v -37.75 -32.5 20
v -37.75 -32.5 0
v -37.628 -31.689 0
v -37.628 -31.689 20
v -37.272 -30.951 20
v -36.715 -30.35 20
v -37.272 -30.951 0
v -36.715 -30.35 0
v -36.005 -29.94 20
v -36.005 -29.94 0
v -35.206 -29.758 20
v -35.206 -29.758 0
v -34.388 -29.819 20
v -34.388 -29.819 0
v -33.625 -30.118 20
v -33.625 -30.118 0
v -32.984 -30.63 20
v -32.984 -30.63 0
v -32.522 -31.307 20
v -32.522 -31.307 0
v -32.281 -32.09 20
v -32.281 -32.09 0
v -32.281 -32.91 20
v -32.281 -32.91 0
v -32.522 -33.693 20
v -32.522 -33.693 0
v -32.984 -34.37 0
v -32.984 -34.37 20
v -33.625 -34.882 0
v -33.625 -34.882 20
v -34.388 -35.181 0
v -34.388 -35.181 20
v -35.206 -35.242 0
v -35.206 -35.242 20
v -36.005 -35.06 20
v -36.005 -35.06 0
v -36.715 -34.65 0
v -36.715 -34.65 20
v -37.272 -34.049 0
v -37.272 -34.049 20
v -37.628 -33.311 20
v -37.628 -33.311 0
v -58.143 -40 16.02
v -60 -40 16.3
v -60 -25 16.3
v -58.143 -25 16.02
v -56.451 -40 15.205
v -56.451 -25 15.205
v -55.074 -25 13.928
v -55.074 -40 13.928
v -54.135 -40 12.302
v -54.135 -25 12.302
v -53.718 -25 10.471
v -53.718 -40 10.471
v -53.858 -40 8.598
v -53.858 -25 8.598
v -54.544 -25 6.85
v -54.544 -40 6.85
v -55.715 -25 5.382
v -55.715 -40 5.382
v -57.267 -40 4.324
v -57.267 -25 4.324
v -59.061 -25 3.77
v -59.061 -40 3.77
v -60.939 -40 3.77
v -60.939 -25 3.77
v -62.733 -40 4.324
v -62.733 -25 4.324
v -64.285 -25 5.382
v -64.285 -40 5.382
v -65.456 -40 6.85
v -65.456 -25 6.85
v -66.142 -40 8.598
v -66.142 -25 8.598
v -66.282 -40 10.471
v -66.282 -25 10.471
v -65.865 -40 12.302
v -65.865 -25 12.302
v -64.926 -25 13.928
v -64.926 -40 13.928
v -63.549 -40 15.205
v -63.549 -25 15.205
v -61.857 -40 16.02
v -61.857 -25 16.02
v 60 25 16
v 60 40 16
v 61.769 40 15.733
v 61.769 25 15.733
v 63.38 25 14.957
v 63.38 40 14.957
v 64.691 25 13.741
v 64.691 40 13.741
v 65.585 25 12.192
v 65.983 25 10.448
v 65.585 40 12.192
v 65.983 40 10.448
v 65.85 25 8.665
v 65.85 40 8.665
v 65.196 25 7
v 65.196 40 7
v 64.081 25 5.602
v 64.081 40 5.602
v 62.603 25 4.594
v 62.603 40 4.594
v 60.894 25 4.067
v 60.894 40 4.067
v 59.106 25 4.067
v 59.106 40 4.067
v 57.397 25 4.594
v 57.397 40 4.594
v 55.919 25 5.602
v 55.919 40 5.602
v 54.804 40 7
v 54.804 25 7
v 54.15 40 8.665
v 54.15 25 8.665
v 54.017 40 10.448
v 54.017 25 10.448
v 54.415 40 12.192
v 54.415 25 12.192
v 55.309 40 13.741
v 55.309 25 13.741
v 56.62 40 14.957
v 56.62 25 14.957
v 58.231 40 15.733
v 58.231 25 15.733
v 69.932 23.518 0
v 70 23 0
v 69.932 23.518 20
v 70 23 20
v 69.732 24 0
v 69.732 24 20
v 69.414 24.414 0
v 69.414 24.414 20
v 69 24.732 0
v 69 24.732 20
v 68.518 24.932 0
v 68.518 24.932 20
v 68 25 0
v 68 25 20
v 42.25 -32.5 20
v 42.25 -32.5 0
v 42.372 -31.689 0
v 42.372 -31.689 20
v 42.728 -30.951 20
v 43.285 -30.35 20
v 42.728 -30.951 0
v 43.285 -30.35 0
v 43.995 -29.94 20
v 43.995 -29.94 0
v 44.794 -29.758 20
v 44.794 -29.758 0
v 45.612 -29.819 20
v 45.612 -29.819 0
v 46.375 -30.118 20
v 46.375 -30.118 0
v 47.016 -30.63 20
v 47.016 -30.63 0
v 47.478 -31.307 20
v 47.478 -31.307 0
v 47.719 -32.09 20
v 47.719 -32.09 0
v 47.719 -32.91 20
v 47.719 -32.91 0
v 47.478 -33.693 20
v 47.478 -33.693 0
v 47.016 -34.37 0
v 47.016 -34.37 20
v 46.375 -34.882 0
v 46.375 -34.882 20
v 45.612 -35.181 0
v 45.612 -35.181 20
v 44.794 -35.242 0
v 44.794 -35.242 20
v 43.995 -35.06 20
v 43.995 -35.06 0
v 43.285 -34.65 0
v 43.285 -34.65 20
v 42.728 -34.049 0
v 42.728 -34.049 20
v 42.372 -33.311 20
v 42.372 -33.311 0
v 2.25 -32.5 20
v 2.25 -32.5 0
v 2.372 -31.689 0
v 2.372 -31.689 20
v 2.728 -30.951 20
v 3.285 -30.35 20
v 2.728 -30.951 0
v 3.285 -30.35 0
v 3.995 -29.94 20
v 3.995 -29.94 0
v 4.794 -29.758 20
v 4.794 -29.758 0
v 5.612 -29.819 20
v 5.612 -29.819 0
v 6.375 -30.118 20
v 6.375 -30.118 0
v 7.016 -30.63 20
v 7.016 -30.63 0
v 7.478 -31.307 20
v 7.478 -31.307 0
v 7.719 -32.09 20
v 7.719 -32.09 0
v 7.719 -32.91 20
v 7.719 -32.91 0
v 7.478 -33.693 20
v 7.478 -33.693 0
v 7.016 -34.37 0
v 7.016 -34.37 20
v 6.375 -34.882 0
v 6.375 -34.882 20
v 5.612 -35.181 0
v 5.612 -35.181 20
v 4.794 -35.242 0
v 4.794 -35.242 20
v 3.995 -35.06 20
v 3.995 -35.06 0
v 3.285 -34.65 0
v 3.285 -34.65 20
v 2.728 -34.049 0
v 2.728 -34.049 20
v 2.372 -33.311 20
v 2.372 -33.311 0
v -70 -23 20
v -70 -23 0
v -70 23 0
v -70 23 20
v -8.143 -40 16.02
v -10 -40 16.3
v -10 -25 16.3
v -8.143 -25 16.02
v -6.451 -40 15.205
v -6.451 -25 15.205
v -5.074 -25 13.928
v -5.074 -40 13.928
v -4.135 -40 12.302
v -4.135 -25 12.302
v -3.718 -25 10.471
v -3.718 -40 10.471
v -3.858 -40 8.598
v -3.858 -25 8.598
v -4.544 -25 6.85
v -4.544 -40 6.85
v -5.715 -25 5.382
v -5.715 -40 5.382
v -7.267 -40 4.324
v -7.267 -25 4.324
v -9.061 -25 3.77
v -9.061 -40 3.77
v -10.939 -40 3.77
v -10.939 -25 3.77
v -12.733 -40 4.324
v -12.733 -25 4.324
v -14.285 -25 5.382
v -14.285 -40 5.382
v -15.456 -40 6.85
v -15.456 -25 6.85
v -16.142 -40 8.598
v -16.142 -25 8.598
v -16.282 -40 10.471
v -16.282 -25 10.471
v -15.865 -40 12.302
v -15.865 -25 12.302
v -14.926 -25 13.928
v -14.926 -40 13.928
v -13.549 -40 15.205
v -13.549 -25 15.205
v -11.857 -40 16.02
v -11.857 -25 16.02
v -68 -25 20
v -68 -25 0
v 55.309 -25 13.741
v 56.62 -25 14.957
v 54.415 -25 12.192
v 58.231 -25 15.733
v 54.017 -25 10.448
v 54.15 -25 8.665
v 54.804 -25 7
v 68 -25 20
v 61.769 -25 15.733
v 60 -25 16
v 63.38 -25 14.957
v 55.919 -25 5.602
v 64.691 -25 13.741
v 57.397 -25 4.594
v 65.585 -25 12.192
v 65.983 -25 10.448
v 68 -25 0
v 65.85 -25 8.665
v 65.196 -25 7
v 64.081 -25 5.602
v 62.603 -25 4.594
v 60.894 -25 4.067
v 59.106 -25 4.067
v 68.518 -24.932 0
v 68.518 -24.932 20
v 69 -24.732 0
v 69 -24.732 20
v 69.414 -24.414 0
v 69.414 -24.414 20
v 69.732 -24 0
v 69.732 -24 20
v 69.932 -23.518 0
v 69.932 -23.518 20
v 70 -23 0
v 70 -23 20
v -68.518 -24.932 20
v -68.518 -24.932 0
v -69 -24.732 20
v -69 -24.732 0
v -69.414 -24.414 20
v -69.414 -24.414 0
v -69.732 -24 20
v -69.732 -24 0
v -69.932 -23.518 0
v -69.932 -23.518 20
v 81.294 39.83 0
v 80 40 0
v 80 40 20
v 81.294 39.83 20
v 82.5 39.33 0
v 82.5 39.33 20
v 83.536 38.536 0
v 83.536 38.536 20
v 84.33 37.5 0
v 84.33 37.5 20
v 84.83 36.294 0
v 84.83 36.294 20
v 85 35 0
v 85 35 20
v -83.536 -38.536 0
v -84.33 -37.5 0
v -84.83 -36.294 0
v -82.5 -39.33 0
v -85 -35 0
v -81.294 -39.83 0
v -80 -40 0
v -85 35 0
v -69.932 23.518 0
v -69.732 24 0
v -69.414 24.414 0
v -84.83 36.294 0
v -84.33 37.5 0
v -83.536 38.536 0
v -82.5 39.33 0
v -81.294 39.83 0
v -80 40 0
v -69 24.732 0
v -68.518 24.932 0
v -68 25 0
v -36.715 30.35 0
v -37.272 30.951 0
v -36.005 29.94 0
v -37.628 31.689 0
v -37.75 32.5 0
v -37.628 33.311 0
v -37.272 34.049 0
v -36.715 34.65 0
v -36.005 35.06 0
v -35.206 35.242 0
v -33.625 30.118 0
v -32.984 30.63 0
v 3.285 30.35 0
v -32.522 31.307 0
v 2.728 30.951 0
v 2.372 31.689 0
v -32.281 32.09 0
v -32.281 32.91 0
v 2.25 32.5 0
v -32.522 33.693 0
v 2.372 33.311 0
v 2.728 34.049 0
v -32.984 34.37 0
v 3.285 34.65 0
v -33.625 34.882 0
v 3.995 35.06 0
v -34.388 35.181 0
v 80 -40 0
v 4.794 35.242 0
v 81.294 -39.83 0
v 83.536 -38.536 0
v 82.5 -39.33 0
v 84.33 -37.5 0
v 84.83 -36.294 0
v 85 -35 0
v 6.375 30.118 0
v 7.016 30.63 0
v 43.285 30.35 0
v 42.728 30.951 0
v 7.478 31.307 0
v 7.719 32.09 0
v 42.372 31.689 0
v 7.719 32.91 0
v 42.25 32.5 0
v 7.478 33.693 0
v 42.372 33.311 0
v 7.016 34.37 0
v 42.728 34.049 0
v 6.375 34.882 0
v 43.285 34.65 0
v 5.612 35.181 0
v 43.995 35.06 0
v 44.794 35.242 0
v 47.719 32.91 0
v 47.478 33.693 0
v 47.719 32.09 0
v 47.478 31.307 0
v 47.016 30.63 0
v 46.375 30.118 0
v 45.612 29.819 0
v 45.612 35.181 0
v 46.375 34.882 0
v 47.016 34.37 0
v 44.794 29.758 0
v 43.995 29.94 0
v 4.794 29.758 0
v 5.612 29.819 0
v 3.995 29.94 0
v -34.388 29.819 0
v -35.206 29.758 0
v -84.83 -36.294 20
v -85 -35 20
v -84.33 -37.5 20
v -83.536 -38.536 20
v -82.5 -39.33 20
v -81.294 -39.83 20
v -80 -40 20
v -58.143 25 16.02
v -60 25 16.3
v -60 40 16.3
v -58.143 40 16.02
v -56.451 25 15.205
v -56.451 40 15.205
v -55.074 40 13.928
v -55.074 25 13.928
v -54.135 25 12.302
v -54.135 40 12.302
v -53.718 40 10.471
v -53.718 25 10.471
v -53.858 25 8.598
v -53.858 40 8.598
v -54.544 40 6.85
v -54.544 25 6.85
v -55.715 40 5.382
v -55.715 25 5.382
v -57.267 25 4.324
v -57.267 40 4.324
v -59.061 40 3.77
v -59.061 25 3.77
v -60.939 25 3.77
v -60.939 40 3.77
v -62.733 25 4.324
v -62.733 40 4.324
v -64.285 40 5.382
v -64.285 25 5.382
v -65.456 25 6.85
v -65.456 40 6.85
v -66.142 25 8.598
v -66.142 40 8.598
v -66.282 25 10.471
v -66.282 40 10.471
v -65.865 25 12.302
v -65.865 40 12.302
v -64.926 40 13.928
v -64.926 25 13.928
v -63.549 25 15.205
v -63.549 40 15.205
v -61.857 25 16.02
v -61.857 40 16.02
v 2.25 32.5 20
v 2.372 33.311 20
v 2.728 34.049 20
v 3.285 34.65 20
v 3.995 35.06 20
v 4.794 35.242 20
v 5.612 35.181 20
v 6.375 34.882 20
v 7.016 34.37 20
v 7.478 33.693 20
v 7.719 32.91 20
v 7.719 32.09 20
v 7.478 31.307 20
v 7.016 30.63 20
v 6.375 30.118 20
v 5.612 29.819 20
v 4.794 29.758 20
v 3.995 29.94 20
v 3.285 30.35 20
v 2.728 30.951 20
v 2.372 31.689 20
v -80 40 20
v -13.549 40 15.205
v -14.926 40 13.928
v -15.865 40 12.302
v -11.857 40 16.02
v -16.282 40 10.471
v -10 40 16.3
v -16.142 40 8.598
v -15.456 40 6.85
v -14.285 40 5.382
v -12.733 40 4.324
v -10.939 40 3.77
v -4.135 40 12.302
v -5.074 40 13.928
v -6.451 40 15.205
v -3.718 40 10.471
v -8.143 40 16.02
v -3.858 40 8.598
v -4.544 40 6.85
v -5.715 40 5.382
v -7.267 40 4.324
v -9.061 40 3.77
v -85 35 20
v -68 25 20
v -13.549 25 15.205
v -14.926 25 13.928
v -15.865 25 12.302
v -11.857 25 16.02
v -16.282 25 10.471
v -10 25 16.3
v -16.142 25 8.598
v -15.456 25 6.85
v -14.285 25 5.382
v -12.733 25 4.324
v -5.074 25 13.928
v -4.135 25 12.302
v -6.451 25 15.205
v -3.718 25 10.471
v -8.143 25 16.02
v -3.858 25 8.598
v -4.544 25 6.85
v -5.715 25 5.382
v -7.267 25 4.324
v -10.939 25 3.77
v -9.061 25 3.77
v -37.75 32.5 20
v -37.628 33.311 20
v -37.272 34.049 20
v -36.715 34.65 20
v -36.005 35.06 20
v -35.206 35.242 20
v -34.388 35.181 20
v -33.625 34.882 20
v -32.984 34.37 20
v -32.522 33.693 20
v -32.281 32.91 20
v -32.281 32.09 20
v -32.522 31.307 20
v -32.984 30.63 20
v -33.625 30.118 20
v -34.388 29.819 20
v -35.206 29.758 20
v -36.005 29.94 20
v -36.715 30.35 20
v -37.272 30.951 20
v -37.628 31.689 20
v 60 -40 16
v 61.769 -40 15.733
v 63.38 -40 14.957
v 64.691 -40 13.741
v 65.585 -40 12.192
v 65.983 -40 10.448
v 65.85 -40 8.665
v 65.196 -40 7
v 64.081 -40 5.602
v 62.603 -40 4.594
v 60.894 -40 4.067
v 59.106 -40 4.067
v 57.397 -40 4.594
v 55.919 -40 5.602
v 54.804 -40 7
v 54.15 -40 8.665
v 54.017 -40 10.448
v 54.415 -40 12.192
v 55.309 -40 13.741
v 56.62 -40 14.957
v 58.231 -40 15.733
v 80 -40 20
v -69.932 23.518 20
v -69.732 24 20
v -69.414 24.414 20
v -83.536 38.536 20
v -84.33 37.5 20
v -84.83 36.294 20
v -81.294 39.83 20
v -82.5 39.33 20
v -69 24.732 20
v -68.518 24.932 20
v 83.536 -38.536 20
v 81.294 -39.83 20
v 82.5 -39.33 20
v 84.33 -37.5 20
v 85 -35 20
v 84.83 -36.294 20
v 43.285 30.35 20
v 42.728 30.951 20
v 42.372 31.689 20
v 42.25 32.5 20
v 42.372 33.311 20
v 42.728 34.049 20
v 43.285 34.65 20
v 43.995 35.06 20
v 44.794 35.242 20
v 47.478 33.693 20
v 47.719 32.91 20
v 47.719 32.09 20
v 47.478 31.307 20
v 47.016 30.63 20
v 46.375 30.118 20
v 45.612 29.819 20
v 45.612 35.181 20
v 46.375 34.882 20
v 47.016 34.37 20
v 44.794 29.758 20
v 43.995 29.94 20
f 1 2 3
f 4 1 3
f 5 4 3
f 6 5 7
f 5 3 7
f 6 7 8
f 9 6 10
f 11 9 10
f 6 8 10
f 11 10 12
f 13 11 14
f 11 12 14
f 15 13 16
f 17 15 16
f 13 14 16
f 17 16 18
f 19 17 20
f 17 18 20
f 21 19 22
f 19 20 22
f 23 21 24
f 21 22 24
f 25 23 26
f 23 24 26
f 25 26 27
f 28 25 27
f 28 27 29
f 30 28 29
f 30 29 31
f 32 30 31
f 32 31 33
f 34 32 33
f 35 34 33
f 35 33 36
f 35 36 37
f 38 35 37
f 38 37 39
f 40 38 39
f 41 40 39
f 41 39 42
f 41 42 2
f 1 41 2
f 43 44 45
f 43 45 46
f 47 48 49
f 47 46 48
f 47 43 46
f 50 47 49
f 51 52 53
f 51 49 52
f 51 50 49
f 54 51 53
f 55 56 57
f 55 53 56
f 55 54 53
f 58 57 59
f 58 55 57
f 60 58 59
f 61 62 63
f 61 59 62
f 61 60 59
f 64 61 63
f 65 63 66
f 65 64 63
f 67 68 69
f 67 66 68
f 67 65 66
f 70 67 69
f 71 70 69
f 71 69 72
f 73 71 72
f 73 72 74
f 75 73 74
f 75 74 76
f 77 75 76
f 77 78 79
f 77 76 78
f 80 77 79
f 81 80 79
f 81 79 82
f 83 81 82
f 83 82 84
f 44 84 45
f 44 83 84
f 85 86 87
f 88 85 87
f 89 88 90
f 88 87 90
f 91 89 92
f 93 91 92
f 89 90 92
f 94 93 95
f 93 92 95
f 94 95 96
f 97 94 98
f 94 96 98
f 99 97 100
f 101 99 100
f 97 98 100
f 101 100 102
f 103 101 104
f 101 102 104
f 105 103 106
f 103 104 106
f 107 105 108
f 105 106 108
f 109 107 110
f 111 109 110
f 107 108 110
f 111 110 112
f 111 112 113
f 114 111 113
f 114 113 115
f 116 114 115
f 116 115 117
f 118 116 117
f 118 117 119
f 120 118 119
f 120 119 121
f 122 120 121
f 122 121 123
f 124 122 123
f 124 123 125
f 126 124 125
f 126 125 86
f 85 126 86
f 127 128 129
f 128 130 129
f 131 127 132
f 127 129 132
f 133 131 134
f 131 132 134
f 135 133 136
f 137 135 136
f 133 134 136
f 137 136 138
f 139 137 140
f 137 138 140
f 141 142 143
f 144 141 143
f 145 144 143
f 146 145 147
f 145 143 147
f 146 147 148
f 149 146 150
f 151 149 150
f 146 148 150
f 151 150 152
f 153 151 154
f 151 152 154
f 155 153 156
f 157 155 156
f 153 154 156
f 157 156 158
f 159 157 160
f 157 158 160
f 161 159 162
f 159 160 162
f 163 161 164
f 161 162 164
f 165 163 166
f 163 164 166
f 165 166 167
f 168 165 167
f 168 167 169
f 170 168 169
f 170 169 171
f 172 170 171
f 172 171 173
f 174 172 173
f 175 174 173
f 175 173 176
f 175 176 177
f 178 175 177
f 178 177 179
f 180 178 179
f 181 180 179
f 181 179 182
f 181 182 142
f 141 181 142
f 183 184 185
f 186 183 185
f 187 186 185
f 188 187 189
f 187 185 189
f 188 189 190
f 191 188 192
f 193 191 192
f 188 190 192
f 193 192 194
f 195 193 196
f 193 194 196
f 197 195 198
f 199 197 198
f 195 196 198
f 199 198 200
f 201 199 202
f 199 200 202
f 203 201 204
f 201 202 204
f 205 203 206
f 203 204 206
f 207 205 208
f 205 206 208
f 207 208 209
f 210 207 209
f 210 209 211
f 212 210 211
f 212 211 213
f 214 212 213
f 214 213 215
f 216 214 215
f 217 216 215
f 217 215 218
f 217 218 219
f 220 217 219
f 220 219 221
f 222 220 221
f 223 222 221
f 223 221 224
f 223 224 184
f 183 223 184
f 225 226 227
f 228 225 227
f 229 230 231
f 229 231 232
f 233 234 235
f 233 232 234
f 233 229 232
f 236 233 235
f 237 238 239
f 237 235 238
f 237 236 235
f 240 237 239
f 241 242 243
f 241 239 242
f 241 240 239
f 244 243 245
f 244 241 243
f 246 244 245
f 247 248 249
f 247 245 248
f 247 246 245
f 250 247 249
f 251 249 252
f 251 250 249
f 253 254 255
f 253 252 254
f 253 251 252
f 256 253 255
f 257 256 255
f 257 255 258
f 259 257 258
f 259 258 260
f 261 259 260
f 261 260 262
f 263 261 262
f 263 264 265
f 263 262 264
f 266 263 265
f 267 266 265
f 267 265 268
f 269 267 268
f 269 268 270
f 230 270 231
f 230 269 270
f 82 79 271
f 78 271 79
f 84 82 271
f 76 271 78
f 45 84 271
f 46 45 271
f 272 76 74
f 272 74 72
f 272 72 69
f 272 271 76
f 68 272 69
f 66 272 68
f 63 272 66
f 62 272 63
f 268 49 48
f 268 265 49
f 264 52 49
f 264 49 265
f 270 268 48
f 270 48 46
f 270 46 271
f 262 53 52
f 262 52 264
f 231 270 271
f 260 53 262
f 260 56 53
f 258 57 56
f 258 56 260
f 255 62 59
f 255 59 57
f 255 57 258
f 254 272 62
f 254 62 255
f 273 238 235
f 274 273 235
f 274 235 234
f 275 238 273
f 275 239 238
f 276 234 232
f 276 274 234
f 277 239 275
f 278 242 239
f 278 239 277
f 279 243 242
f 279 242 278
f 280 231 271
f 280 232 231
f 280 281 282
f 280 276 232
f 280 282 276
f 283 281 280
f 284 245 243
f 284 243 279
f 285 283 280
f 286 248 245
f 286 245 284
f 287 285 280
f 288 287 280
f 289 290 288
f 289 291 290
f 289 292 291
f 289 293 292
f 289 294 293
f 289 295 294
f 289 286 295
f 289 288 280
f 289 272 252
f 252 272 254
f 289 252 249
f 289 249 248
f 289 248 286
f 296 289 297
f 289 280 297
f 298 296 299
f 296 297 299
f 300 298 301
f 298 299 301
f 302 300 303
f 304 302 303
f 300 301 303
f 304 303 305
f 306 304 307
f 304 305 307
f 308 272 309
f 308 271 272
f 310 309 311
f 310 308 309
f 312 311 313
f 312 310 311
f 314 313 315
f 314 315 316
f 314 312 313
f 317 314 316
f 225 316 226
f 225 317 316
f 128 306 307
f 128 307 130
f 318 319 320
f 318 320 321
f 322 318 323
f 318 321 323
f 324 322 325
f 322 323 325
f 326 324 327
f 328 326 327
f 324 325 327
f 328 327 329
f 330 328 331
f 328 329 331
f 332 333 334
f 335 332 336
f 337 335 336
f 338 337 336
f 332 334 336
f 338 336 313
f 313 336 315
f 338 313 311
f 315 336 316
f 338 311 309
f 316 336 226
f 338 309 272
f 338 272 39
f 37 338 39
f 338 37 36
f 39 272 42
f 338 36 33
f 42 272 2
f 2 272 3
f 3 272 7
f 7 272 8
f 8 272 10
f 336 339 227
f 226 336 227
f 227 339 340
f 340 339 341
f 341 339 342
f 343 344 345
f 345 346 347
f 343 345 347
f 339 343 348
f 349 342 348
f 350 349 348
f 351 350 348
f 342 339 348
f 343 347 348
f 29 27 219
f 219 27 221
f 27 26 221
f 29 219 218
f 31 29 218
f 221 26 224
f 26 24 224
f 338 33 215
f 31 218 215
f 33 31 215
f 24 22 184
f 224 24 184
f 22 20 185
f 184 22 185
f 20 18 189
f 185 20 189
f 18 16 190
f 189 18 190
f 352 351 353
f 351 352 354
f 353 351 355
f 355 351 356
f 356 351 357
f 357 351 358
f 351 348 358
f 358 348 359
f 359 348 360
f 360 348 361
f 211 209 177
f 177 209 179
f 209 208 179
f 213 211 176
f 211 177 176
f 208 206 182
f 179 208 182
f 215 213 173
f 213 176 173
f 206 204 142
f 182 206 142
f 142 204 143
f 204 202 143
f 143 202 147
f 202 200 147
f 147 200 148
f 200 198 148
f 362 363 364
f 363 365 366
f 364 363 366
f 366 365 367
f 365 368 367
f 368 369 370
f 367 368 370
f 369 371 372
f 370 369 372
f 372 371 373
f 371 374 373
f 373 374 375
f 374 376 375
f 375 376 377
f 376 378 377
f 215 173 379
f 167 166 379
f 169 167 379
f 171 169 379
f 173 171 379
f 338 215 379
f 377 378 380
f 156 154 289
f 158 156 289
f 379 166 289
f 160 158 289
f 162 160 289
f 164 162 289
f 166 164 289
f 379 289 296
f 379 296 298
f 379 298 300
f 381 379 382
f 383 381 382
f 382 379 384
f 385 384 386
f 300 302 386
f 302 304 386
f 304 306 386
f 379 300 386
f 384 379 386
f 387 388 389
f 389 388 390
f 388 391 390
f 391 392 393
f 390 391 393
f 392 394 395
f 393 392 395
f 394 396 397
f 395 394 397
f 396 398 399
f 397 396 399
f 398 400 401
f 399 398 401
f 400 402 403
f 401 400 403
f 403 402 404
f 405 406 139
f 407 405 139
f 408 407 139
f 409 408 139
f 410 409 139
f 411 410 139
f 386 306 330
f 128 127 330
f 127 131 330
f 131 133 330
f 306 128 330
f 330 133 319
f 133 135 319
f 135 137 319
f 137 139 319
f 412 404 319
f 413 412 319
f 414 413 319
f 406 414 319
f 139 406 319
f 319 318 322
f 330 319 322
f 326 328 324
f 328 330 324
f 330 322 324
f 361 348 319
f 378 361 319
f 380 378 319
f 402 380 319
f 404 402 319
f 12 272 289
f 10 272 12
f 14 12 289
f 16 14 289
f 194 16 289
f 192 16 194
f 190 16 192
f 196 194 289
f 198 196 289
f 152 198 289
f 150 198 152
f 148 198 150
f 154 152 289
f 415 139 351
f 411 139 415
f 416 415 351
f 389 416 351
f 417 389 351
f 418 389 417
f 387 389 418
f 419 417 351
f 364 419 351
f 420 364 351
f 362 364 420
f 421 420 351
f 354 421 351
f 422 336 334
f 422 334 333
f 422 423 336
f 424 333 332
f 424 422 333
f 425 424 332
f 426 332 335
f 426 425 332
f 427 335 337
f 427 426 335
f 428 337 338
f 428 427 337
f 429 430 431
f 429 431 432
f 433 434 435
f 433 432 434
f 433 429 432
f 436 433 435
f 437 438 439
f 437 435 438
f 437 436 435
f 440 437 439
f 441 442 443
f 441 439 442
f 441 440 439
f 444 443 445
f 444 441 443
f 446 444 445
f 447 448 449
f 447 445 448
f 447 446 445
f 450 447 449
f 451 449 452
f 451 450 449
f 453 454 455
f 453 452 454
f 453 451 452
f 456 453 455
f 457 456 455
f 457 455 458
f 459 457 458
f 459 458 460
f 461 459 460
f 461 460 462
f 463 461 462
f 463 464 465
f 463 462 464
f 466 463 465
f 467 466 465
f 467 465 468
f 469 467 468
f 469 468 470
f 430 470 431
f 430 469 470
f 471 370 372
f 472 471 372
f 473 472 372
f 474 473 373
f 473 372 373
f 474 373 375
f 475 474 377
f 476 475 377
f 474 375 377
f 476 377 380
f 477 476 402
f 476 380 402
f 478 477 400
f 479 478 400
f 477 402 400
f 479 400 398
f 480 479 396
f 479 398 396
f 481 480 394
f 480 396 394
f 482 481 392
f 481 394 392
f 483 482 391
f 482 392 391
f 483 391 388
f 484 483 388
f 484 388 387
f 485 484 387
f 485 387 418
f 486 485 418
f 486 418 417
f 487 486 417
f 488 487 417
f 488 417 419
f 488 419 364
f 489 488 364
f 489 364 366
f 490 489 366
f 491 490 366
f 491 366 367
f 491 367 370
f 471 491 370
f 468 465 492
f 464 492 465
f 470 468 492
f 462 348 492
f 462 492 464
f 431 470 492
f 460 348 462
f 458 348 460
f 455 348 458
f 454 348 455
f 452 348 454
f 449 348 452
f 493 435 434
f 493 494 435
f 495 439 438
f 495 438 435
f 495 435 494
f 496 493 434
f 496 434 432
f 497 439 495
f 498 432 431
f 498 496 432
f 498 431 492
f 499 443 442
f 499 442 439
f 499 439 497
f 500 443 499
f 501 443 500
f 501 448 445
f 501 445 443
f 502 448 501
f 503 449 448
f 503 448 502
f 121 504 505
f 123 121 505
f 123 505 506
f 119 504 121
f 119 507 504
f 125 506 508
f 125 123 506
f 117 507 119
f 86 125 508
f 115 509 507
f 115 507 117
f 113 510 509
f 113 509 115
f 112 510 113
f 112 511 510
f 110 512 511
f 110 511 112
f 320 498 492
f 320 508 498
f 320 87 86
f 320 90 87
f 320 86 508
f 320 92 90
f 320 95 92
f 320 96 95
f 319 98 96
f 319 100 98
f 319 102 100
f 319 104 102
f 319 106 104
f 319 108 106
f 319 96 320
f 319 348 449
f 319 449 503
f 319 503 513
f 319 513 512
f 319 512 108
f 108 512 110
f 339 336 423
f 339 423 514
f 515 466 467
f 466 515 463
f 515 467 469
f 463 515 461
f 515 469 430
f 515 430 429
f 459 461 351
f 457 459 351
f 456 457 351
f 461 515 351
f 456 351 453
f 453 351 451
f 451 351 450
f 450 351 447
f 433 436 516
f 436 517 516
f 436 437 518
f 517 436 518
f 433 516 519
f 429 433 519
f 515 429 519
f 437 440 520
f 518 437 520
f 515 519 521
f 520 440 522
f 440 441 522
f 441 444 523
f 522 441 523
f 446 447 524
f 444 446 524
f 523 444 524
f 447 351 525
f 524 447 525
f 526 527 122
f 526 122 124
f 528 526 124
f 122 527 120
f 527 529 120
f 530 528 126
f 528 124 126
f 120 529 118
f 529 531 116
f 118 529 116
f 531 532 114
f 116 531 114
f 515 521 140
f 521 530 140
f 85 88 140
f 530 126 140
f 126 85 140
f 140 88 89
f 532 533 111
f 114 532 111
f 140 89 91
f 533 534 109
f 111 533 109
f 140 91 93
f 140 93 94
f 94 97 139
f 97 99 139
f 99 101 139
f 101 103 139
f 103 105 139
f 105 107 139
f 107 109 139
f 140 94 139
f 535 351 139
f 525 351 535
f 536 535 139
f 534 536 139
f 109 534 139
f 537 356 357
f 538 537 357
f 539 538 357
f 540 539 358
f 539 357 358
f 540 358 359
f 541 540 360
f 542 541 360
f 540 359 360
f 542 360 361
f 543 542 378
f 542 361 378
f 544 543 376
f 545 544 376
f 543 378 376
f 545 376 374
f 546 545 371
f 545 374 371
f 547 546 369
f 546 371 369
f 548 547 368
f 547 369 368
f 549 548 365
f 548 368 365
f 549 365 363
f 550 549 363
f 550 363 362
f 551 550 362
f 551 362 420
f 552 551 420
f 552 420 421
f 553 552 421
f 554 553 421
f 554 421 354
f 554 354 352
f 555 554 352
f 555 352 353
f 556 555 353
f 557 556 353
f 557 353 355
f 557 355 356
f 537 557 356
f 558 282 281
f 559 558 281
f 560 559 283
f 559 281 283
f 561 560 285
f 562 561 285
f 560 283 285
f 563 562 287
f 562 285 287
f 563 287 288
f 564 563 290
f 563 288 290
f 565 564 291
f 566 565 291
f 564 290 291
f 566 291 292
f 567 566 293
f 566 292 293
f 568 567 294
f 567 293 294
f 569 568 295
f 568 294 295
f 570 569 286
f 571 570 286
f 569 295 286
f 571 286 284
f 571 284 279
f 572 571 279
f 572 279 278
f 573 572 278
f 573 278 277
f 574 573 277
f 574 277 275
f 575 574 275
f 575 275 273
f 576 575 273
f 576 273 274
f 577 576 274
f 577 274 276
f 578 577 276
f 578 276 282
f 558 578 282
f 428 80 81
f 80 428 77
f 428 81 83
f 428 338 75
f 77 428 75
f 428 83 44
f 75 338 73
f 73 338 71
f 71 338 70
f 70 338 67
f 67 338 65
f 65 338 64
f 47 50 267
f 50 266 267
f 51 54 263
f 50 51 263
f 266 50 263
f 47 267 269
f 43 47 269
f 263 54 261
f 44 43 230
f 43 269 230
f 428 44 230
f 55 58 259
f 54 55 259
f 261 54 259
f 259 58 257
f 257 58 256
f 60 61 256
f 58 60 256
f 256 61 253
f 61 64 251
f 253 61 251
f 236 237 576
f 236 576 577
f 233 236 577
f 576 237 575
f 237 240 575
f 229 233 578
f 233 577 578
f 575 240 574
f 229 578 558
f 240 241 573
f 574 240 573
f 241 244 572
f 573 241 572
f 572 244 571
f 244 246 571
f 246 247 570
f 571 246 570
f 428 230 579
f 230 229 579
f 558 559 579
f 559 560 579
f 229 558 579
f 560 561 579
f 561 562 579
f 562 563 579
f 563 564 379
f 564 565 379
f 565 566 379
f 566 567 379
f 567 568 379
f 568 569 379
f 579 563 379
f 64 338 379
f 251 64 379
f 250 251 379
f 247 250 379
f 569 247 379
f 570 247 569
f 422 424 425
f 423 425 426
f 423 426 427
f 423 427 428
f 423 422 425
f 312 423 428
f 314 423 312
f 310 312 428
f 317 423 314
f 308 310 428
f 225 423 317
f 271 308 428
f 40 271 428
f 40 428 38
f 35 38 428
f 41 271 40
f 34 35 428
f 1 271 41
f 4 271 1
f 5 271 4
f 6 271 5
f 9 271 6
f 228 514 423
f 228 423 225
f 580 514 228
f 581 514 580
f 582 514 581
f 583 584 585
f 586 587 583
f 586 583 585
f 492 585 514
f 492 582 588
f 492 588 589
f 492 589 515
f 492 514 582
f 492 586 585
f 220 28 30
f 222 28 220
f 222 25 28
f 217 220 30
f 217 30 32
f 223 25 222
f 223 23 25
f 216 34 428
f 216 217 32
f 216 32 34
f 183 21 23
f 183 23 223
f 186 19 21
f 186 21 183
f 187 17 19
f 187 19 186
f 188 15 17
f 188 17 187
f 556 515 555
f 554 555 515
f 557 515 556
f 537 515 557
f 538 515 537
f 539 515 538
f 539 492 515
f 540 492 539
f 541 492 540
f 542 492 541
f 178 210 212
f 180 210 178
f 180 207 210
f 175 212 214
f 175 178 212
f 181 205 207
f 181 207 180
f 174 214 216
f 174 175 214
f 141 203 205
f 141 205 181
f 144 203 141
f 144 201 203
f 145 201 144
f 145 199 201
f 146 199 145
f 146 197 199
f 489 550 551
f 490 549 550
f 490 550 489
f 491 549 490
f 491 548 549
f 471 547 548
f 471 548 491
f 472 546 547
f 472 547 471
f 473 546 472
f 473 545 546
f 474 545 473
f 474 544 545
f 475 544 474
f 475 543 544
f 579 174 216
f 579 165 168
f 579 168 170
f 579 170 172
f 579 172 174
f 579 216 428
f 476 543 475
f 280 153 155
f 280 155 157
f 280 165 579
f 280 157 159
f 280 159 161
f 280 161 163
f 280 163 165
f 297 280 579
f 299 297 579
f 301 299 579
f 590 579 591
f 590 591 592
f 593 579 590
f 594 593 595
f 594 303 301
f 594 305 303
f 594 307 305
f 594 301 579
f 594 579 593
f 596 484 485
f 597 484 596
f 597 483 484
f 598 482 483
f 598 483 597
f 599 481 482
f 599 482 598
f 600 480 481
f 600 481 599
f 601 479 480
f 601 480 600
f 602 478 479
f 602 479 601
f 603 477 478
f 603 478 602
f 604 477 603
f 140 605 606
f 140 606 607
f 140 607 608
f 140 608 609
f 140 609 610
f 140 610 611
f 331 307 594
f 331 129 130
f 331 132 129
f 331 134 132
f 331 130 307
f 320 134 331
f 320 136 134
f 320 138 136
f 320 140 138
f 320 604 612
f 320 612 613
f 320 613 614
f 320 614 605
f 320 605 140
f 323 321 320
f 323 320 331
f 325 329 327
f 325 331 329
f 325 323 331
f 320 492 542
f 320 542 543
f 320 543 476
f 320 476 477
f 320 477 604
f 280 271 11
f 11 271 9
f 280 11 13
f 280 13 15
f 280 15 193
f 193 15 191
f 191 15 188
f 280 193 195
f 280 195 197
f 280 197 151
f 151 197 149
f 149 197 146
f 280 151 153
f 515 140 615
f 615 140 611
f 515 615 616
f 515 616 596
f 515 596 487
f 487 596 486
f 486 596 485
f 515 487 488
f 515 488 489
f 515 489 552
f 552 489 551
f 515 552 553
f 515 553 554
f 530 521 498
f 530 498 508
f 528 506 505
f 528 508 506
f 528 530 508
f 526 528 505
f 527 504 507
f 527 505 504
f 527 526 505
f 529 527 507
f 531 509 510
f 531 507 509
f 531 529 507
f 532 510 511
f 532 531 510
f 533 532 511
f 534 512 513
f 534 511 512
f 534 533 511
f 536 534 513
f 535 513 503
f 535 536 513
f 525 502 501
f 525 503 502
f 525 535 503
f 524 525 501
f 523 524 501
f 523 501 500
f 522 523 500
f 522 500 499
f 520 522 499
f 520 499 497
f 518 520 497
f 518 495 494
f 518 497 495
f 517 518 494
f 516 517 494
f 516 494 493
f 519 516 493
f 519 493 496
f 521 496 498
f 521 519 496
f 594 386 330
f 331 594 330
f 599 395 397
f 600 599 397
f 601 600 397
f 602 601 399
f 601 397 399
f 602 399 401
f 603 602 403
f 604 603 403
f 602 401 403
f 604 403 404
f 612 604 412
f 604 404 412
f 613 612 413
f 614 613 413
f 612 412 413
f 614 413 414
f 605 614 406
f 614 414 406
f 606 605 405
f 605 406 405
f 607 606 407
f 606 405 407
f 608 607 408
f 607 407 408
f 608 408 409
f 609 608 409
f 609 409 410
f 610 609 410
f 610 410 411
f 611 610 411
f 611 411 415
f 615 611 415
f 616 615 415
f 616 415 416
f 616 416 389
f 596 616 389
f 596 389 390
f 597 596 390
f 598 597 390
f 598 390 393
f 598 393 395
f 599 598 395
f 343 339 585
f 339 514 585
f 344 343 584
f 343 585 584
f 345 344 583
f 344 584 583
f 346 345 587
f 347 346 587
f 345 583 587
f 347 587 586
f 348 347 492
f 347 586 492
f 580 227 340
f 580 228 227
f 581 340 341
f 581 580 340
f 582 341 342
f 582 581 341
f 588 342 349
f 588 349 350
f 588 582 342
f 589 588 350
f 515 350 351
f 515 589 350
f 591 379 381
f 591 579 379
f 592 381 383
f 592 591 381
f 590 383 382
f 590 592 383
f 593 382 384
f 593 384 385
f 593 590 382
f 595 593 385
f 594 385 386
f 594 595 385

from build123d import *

# Parameters (mm, degrees)
SKETCH1_W               = 170
SKETCH1_H               = 80
SKETCH1_W_2             = 140
SKETCH1_H_2             = 50
BOSS_EXTRUDE1_DEPTH     = 20
CUT_EXTRUDE1_DEPTH      = 119.427192823
CUT_EXTRUDE1_DEPTH_BACK = 119.427192823
SKETCH2_R               = 6.3
CUT_EXTRUDE3_REACH      = 98.047
SKETCH5_R               = 2.75
FILLET1_R               = 2
FILLET2_R               = 5
SKETCH6_R               = 6
CUT_EXTRUDE4_DEPTH      = 119.427192823
SKETCH7_R               = 2.75
CUT_EXTRUDE5_DEPTH      = 97.046863561


with BuildPart() as part:
    # Sketch1 → Boss-Extrude1 (new body)
    with BuildSketch(Plane.XY):
        Rectangle(SKETCH1_W, SKETCH1_H)
        Rectangle(SKETCH1_W_2, SKETCH1_H_2, mode=Mode.SUBTRACT)
    extrude(amount=BOSS_EXTRUDE1_DEPTH)

    # Sketch2 → Cut-Extrude1 (cut, two sides: drawn at the far end of the back side and taken through both)
    with BuildSketch(Plane(origin=(0, 40, 0), x_dir=(1, 0, 0), z_dir=(0, 1, 0)).offset(-CUT_EXTRUDE1_DEPTH_BACK)):
        with Locations(Location((-60, -10, 0), (0, 0, 270))):
            Circle(SKETCH2_R)
        with Locations(Location((-10, -10, 0), (0, 0, 270))):
            Circle(SKETCH2_R)
    extrude(amount=CUT_EXTRUDE1_DEPTH + CUT_EXTRUDE1_DEPTH_BACK, mode=Mode.SUBTRACT)

    # Sketch5 → Cut-Extrude3 (cut, up to next)
    with BuildSketch(Plane(origin=(0, 0, 0), x_dir=(-1, 0, 0), z_dir=(0, 0, -1)), mode=Mode.PRIVATE) as cut_extrude3_sk1:
        with Locations((35, 32.5)):
            Circle(SKETCH5_R)
    cut_extrude3_tool1 = extrude(cut_extrude3_sk1.sketch, amount=-CUT_EXTRUDE3_REACH, mode=Mode.PRIVATE) & part.part
    # Sketch5 → Cut-Extrude3 (cut, up to next)
    with BuildSketch(Plane(origin=(0, 0, 0), x_dir=(-1, 0, 0), z_dir=(0, 0, -1)), mode=Mode.PRIVATE) as cut_extrude3_sk2:
        with Locations((35, -32.5)):
            Circle(SKETCH5_R)
    cut_extrude3_tool2 = extrude(cut_extrude3_sk2.sketch, amount=-CUT_EXTRUDE3_REACH, mode=Mode.PRIVATE) & part.part
    # Sketch5 → Cut-Extrude3 (cut, up to next)
    with BuildSketch(Plane(origin=(0, 0, 0), x_dir=(-1, 0, 0), z_dir=(0, 0, -1)), mode=Mode.PRIVATE) as cut_extrude3_sk3:
        with Locations((-5, 32.5)):
            Circle(SKETCH5_R)
    cut_extrude3_tool3 = extrude(cut_extrude3_sk3.sketch, amount=-CUT_EXTRUDE3_REACH, mode=Mode.PRIVATE) & part.part
    # Sketch5 → Cut-Extrude3 (cut, up to next)
    with BuildSketch(Plane(origin=(0, 0, 0), x_dir=(-1, 0, 0), z_dir=(0, 0, -1)), mode=Mode.PRIVATE) as cut_extrude3_sk4:
        with Locations((-5, -32.5)):
            Circle(SKETCH5_R)
    cut_extrude3_tool4 = extrude(cut_extrude3_sk4.sketch, amount=-CUT_EXTRUDE3_REACH, mode=Mode.PRIVATE) & part.part
    add(cut_extrude3_tool1.solids().sort_by_distance((-35, 32.5, 0))[0], mode=Mode.SUBTRACT)
    add(cut_extrude3_tool2.solids().sort_by_distance((-35, -32.5, 0))[0], mode=Mode.SUBTRACT)
    add(cut_extrude3_tool3.solids().sort_by_distance((5, 32.5, 0))[0], mode=Mode.SUBTRACT)
    add(cut_extrude3_tool4.solids().sort_by_distance((5, -32.5, 0))[0], mode=Mode.SUBTRACT)

    # Fillet1
    fillet1_edges = [part.edges().sort_by_distance(p)[0] for p in [
        (70, -25, 10),
        (70, 25, 10),
        (-70, 25, 10),
        (-70, -25, 10),
    ]]
    fillet(fillet1_edges, radius=FILLET1_R)

    # Fillet2
    fillet2_edges = [part.edges().sort_by_distance(p)[0] for p in [
        (85, -40, 10),
        (-85, -40, 10),
        (-85, 40, 10),
        (85, 40, 10),
    ]]
    fillet(fillet2_edges, radius=FILLET2_R)

    # Sketch6 → Cut-Extrude4 (cut, through all)
    with BuildSketch(Plane(origin=(0, 40, 0), x_dir=(1, 0, 0), z_dir=(0, 1, 0))):
        with Locations(Location((60, -10, 0), (0, 0, 270))):
            Circle(SKETCH6_R)
    extrude(amount=-CUT_EXTRUDE4_DEPTH, mode=Mode.SUBTRACT)

    # Sketch7 → Cut-Extrude5 (cut, through all)
    with BuildSketch(Plane(origin=(0, 0, 0), x_dir=(-1, 0, 0), z_dir=(0, 0, -1))):
        with Locations((-45, 32.5)):
            Circle(SKETCH7_R)
        with Locations((-45, -32.5)):
            Circle(SKETCH7_R)
    extrude(amount=-CUT_EXTRUDE5_DEPTH, mode=Mode.SUBTRACT)


solid = part.part
